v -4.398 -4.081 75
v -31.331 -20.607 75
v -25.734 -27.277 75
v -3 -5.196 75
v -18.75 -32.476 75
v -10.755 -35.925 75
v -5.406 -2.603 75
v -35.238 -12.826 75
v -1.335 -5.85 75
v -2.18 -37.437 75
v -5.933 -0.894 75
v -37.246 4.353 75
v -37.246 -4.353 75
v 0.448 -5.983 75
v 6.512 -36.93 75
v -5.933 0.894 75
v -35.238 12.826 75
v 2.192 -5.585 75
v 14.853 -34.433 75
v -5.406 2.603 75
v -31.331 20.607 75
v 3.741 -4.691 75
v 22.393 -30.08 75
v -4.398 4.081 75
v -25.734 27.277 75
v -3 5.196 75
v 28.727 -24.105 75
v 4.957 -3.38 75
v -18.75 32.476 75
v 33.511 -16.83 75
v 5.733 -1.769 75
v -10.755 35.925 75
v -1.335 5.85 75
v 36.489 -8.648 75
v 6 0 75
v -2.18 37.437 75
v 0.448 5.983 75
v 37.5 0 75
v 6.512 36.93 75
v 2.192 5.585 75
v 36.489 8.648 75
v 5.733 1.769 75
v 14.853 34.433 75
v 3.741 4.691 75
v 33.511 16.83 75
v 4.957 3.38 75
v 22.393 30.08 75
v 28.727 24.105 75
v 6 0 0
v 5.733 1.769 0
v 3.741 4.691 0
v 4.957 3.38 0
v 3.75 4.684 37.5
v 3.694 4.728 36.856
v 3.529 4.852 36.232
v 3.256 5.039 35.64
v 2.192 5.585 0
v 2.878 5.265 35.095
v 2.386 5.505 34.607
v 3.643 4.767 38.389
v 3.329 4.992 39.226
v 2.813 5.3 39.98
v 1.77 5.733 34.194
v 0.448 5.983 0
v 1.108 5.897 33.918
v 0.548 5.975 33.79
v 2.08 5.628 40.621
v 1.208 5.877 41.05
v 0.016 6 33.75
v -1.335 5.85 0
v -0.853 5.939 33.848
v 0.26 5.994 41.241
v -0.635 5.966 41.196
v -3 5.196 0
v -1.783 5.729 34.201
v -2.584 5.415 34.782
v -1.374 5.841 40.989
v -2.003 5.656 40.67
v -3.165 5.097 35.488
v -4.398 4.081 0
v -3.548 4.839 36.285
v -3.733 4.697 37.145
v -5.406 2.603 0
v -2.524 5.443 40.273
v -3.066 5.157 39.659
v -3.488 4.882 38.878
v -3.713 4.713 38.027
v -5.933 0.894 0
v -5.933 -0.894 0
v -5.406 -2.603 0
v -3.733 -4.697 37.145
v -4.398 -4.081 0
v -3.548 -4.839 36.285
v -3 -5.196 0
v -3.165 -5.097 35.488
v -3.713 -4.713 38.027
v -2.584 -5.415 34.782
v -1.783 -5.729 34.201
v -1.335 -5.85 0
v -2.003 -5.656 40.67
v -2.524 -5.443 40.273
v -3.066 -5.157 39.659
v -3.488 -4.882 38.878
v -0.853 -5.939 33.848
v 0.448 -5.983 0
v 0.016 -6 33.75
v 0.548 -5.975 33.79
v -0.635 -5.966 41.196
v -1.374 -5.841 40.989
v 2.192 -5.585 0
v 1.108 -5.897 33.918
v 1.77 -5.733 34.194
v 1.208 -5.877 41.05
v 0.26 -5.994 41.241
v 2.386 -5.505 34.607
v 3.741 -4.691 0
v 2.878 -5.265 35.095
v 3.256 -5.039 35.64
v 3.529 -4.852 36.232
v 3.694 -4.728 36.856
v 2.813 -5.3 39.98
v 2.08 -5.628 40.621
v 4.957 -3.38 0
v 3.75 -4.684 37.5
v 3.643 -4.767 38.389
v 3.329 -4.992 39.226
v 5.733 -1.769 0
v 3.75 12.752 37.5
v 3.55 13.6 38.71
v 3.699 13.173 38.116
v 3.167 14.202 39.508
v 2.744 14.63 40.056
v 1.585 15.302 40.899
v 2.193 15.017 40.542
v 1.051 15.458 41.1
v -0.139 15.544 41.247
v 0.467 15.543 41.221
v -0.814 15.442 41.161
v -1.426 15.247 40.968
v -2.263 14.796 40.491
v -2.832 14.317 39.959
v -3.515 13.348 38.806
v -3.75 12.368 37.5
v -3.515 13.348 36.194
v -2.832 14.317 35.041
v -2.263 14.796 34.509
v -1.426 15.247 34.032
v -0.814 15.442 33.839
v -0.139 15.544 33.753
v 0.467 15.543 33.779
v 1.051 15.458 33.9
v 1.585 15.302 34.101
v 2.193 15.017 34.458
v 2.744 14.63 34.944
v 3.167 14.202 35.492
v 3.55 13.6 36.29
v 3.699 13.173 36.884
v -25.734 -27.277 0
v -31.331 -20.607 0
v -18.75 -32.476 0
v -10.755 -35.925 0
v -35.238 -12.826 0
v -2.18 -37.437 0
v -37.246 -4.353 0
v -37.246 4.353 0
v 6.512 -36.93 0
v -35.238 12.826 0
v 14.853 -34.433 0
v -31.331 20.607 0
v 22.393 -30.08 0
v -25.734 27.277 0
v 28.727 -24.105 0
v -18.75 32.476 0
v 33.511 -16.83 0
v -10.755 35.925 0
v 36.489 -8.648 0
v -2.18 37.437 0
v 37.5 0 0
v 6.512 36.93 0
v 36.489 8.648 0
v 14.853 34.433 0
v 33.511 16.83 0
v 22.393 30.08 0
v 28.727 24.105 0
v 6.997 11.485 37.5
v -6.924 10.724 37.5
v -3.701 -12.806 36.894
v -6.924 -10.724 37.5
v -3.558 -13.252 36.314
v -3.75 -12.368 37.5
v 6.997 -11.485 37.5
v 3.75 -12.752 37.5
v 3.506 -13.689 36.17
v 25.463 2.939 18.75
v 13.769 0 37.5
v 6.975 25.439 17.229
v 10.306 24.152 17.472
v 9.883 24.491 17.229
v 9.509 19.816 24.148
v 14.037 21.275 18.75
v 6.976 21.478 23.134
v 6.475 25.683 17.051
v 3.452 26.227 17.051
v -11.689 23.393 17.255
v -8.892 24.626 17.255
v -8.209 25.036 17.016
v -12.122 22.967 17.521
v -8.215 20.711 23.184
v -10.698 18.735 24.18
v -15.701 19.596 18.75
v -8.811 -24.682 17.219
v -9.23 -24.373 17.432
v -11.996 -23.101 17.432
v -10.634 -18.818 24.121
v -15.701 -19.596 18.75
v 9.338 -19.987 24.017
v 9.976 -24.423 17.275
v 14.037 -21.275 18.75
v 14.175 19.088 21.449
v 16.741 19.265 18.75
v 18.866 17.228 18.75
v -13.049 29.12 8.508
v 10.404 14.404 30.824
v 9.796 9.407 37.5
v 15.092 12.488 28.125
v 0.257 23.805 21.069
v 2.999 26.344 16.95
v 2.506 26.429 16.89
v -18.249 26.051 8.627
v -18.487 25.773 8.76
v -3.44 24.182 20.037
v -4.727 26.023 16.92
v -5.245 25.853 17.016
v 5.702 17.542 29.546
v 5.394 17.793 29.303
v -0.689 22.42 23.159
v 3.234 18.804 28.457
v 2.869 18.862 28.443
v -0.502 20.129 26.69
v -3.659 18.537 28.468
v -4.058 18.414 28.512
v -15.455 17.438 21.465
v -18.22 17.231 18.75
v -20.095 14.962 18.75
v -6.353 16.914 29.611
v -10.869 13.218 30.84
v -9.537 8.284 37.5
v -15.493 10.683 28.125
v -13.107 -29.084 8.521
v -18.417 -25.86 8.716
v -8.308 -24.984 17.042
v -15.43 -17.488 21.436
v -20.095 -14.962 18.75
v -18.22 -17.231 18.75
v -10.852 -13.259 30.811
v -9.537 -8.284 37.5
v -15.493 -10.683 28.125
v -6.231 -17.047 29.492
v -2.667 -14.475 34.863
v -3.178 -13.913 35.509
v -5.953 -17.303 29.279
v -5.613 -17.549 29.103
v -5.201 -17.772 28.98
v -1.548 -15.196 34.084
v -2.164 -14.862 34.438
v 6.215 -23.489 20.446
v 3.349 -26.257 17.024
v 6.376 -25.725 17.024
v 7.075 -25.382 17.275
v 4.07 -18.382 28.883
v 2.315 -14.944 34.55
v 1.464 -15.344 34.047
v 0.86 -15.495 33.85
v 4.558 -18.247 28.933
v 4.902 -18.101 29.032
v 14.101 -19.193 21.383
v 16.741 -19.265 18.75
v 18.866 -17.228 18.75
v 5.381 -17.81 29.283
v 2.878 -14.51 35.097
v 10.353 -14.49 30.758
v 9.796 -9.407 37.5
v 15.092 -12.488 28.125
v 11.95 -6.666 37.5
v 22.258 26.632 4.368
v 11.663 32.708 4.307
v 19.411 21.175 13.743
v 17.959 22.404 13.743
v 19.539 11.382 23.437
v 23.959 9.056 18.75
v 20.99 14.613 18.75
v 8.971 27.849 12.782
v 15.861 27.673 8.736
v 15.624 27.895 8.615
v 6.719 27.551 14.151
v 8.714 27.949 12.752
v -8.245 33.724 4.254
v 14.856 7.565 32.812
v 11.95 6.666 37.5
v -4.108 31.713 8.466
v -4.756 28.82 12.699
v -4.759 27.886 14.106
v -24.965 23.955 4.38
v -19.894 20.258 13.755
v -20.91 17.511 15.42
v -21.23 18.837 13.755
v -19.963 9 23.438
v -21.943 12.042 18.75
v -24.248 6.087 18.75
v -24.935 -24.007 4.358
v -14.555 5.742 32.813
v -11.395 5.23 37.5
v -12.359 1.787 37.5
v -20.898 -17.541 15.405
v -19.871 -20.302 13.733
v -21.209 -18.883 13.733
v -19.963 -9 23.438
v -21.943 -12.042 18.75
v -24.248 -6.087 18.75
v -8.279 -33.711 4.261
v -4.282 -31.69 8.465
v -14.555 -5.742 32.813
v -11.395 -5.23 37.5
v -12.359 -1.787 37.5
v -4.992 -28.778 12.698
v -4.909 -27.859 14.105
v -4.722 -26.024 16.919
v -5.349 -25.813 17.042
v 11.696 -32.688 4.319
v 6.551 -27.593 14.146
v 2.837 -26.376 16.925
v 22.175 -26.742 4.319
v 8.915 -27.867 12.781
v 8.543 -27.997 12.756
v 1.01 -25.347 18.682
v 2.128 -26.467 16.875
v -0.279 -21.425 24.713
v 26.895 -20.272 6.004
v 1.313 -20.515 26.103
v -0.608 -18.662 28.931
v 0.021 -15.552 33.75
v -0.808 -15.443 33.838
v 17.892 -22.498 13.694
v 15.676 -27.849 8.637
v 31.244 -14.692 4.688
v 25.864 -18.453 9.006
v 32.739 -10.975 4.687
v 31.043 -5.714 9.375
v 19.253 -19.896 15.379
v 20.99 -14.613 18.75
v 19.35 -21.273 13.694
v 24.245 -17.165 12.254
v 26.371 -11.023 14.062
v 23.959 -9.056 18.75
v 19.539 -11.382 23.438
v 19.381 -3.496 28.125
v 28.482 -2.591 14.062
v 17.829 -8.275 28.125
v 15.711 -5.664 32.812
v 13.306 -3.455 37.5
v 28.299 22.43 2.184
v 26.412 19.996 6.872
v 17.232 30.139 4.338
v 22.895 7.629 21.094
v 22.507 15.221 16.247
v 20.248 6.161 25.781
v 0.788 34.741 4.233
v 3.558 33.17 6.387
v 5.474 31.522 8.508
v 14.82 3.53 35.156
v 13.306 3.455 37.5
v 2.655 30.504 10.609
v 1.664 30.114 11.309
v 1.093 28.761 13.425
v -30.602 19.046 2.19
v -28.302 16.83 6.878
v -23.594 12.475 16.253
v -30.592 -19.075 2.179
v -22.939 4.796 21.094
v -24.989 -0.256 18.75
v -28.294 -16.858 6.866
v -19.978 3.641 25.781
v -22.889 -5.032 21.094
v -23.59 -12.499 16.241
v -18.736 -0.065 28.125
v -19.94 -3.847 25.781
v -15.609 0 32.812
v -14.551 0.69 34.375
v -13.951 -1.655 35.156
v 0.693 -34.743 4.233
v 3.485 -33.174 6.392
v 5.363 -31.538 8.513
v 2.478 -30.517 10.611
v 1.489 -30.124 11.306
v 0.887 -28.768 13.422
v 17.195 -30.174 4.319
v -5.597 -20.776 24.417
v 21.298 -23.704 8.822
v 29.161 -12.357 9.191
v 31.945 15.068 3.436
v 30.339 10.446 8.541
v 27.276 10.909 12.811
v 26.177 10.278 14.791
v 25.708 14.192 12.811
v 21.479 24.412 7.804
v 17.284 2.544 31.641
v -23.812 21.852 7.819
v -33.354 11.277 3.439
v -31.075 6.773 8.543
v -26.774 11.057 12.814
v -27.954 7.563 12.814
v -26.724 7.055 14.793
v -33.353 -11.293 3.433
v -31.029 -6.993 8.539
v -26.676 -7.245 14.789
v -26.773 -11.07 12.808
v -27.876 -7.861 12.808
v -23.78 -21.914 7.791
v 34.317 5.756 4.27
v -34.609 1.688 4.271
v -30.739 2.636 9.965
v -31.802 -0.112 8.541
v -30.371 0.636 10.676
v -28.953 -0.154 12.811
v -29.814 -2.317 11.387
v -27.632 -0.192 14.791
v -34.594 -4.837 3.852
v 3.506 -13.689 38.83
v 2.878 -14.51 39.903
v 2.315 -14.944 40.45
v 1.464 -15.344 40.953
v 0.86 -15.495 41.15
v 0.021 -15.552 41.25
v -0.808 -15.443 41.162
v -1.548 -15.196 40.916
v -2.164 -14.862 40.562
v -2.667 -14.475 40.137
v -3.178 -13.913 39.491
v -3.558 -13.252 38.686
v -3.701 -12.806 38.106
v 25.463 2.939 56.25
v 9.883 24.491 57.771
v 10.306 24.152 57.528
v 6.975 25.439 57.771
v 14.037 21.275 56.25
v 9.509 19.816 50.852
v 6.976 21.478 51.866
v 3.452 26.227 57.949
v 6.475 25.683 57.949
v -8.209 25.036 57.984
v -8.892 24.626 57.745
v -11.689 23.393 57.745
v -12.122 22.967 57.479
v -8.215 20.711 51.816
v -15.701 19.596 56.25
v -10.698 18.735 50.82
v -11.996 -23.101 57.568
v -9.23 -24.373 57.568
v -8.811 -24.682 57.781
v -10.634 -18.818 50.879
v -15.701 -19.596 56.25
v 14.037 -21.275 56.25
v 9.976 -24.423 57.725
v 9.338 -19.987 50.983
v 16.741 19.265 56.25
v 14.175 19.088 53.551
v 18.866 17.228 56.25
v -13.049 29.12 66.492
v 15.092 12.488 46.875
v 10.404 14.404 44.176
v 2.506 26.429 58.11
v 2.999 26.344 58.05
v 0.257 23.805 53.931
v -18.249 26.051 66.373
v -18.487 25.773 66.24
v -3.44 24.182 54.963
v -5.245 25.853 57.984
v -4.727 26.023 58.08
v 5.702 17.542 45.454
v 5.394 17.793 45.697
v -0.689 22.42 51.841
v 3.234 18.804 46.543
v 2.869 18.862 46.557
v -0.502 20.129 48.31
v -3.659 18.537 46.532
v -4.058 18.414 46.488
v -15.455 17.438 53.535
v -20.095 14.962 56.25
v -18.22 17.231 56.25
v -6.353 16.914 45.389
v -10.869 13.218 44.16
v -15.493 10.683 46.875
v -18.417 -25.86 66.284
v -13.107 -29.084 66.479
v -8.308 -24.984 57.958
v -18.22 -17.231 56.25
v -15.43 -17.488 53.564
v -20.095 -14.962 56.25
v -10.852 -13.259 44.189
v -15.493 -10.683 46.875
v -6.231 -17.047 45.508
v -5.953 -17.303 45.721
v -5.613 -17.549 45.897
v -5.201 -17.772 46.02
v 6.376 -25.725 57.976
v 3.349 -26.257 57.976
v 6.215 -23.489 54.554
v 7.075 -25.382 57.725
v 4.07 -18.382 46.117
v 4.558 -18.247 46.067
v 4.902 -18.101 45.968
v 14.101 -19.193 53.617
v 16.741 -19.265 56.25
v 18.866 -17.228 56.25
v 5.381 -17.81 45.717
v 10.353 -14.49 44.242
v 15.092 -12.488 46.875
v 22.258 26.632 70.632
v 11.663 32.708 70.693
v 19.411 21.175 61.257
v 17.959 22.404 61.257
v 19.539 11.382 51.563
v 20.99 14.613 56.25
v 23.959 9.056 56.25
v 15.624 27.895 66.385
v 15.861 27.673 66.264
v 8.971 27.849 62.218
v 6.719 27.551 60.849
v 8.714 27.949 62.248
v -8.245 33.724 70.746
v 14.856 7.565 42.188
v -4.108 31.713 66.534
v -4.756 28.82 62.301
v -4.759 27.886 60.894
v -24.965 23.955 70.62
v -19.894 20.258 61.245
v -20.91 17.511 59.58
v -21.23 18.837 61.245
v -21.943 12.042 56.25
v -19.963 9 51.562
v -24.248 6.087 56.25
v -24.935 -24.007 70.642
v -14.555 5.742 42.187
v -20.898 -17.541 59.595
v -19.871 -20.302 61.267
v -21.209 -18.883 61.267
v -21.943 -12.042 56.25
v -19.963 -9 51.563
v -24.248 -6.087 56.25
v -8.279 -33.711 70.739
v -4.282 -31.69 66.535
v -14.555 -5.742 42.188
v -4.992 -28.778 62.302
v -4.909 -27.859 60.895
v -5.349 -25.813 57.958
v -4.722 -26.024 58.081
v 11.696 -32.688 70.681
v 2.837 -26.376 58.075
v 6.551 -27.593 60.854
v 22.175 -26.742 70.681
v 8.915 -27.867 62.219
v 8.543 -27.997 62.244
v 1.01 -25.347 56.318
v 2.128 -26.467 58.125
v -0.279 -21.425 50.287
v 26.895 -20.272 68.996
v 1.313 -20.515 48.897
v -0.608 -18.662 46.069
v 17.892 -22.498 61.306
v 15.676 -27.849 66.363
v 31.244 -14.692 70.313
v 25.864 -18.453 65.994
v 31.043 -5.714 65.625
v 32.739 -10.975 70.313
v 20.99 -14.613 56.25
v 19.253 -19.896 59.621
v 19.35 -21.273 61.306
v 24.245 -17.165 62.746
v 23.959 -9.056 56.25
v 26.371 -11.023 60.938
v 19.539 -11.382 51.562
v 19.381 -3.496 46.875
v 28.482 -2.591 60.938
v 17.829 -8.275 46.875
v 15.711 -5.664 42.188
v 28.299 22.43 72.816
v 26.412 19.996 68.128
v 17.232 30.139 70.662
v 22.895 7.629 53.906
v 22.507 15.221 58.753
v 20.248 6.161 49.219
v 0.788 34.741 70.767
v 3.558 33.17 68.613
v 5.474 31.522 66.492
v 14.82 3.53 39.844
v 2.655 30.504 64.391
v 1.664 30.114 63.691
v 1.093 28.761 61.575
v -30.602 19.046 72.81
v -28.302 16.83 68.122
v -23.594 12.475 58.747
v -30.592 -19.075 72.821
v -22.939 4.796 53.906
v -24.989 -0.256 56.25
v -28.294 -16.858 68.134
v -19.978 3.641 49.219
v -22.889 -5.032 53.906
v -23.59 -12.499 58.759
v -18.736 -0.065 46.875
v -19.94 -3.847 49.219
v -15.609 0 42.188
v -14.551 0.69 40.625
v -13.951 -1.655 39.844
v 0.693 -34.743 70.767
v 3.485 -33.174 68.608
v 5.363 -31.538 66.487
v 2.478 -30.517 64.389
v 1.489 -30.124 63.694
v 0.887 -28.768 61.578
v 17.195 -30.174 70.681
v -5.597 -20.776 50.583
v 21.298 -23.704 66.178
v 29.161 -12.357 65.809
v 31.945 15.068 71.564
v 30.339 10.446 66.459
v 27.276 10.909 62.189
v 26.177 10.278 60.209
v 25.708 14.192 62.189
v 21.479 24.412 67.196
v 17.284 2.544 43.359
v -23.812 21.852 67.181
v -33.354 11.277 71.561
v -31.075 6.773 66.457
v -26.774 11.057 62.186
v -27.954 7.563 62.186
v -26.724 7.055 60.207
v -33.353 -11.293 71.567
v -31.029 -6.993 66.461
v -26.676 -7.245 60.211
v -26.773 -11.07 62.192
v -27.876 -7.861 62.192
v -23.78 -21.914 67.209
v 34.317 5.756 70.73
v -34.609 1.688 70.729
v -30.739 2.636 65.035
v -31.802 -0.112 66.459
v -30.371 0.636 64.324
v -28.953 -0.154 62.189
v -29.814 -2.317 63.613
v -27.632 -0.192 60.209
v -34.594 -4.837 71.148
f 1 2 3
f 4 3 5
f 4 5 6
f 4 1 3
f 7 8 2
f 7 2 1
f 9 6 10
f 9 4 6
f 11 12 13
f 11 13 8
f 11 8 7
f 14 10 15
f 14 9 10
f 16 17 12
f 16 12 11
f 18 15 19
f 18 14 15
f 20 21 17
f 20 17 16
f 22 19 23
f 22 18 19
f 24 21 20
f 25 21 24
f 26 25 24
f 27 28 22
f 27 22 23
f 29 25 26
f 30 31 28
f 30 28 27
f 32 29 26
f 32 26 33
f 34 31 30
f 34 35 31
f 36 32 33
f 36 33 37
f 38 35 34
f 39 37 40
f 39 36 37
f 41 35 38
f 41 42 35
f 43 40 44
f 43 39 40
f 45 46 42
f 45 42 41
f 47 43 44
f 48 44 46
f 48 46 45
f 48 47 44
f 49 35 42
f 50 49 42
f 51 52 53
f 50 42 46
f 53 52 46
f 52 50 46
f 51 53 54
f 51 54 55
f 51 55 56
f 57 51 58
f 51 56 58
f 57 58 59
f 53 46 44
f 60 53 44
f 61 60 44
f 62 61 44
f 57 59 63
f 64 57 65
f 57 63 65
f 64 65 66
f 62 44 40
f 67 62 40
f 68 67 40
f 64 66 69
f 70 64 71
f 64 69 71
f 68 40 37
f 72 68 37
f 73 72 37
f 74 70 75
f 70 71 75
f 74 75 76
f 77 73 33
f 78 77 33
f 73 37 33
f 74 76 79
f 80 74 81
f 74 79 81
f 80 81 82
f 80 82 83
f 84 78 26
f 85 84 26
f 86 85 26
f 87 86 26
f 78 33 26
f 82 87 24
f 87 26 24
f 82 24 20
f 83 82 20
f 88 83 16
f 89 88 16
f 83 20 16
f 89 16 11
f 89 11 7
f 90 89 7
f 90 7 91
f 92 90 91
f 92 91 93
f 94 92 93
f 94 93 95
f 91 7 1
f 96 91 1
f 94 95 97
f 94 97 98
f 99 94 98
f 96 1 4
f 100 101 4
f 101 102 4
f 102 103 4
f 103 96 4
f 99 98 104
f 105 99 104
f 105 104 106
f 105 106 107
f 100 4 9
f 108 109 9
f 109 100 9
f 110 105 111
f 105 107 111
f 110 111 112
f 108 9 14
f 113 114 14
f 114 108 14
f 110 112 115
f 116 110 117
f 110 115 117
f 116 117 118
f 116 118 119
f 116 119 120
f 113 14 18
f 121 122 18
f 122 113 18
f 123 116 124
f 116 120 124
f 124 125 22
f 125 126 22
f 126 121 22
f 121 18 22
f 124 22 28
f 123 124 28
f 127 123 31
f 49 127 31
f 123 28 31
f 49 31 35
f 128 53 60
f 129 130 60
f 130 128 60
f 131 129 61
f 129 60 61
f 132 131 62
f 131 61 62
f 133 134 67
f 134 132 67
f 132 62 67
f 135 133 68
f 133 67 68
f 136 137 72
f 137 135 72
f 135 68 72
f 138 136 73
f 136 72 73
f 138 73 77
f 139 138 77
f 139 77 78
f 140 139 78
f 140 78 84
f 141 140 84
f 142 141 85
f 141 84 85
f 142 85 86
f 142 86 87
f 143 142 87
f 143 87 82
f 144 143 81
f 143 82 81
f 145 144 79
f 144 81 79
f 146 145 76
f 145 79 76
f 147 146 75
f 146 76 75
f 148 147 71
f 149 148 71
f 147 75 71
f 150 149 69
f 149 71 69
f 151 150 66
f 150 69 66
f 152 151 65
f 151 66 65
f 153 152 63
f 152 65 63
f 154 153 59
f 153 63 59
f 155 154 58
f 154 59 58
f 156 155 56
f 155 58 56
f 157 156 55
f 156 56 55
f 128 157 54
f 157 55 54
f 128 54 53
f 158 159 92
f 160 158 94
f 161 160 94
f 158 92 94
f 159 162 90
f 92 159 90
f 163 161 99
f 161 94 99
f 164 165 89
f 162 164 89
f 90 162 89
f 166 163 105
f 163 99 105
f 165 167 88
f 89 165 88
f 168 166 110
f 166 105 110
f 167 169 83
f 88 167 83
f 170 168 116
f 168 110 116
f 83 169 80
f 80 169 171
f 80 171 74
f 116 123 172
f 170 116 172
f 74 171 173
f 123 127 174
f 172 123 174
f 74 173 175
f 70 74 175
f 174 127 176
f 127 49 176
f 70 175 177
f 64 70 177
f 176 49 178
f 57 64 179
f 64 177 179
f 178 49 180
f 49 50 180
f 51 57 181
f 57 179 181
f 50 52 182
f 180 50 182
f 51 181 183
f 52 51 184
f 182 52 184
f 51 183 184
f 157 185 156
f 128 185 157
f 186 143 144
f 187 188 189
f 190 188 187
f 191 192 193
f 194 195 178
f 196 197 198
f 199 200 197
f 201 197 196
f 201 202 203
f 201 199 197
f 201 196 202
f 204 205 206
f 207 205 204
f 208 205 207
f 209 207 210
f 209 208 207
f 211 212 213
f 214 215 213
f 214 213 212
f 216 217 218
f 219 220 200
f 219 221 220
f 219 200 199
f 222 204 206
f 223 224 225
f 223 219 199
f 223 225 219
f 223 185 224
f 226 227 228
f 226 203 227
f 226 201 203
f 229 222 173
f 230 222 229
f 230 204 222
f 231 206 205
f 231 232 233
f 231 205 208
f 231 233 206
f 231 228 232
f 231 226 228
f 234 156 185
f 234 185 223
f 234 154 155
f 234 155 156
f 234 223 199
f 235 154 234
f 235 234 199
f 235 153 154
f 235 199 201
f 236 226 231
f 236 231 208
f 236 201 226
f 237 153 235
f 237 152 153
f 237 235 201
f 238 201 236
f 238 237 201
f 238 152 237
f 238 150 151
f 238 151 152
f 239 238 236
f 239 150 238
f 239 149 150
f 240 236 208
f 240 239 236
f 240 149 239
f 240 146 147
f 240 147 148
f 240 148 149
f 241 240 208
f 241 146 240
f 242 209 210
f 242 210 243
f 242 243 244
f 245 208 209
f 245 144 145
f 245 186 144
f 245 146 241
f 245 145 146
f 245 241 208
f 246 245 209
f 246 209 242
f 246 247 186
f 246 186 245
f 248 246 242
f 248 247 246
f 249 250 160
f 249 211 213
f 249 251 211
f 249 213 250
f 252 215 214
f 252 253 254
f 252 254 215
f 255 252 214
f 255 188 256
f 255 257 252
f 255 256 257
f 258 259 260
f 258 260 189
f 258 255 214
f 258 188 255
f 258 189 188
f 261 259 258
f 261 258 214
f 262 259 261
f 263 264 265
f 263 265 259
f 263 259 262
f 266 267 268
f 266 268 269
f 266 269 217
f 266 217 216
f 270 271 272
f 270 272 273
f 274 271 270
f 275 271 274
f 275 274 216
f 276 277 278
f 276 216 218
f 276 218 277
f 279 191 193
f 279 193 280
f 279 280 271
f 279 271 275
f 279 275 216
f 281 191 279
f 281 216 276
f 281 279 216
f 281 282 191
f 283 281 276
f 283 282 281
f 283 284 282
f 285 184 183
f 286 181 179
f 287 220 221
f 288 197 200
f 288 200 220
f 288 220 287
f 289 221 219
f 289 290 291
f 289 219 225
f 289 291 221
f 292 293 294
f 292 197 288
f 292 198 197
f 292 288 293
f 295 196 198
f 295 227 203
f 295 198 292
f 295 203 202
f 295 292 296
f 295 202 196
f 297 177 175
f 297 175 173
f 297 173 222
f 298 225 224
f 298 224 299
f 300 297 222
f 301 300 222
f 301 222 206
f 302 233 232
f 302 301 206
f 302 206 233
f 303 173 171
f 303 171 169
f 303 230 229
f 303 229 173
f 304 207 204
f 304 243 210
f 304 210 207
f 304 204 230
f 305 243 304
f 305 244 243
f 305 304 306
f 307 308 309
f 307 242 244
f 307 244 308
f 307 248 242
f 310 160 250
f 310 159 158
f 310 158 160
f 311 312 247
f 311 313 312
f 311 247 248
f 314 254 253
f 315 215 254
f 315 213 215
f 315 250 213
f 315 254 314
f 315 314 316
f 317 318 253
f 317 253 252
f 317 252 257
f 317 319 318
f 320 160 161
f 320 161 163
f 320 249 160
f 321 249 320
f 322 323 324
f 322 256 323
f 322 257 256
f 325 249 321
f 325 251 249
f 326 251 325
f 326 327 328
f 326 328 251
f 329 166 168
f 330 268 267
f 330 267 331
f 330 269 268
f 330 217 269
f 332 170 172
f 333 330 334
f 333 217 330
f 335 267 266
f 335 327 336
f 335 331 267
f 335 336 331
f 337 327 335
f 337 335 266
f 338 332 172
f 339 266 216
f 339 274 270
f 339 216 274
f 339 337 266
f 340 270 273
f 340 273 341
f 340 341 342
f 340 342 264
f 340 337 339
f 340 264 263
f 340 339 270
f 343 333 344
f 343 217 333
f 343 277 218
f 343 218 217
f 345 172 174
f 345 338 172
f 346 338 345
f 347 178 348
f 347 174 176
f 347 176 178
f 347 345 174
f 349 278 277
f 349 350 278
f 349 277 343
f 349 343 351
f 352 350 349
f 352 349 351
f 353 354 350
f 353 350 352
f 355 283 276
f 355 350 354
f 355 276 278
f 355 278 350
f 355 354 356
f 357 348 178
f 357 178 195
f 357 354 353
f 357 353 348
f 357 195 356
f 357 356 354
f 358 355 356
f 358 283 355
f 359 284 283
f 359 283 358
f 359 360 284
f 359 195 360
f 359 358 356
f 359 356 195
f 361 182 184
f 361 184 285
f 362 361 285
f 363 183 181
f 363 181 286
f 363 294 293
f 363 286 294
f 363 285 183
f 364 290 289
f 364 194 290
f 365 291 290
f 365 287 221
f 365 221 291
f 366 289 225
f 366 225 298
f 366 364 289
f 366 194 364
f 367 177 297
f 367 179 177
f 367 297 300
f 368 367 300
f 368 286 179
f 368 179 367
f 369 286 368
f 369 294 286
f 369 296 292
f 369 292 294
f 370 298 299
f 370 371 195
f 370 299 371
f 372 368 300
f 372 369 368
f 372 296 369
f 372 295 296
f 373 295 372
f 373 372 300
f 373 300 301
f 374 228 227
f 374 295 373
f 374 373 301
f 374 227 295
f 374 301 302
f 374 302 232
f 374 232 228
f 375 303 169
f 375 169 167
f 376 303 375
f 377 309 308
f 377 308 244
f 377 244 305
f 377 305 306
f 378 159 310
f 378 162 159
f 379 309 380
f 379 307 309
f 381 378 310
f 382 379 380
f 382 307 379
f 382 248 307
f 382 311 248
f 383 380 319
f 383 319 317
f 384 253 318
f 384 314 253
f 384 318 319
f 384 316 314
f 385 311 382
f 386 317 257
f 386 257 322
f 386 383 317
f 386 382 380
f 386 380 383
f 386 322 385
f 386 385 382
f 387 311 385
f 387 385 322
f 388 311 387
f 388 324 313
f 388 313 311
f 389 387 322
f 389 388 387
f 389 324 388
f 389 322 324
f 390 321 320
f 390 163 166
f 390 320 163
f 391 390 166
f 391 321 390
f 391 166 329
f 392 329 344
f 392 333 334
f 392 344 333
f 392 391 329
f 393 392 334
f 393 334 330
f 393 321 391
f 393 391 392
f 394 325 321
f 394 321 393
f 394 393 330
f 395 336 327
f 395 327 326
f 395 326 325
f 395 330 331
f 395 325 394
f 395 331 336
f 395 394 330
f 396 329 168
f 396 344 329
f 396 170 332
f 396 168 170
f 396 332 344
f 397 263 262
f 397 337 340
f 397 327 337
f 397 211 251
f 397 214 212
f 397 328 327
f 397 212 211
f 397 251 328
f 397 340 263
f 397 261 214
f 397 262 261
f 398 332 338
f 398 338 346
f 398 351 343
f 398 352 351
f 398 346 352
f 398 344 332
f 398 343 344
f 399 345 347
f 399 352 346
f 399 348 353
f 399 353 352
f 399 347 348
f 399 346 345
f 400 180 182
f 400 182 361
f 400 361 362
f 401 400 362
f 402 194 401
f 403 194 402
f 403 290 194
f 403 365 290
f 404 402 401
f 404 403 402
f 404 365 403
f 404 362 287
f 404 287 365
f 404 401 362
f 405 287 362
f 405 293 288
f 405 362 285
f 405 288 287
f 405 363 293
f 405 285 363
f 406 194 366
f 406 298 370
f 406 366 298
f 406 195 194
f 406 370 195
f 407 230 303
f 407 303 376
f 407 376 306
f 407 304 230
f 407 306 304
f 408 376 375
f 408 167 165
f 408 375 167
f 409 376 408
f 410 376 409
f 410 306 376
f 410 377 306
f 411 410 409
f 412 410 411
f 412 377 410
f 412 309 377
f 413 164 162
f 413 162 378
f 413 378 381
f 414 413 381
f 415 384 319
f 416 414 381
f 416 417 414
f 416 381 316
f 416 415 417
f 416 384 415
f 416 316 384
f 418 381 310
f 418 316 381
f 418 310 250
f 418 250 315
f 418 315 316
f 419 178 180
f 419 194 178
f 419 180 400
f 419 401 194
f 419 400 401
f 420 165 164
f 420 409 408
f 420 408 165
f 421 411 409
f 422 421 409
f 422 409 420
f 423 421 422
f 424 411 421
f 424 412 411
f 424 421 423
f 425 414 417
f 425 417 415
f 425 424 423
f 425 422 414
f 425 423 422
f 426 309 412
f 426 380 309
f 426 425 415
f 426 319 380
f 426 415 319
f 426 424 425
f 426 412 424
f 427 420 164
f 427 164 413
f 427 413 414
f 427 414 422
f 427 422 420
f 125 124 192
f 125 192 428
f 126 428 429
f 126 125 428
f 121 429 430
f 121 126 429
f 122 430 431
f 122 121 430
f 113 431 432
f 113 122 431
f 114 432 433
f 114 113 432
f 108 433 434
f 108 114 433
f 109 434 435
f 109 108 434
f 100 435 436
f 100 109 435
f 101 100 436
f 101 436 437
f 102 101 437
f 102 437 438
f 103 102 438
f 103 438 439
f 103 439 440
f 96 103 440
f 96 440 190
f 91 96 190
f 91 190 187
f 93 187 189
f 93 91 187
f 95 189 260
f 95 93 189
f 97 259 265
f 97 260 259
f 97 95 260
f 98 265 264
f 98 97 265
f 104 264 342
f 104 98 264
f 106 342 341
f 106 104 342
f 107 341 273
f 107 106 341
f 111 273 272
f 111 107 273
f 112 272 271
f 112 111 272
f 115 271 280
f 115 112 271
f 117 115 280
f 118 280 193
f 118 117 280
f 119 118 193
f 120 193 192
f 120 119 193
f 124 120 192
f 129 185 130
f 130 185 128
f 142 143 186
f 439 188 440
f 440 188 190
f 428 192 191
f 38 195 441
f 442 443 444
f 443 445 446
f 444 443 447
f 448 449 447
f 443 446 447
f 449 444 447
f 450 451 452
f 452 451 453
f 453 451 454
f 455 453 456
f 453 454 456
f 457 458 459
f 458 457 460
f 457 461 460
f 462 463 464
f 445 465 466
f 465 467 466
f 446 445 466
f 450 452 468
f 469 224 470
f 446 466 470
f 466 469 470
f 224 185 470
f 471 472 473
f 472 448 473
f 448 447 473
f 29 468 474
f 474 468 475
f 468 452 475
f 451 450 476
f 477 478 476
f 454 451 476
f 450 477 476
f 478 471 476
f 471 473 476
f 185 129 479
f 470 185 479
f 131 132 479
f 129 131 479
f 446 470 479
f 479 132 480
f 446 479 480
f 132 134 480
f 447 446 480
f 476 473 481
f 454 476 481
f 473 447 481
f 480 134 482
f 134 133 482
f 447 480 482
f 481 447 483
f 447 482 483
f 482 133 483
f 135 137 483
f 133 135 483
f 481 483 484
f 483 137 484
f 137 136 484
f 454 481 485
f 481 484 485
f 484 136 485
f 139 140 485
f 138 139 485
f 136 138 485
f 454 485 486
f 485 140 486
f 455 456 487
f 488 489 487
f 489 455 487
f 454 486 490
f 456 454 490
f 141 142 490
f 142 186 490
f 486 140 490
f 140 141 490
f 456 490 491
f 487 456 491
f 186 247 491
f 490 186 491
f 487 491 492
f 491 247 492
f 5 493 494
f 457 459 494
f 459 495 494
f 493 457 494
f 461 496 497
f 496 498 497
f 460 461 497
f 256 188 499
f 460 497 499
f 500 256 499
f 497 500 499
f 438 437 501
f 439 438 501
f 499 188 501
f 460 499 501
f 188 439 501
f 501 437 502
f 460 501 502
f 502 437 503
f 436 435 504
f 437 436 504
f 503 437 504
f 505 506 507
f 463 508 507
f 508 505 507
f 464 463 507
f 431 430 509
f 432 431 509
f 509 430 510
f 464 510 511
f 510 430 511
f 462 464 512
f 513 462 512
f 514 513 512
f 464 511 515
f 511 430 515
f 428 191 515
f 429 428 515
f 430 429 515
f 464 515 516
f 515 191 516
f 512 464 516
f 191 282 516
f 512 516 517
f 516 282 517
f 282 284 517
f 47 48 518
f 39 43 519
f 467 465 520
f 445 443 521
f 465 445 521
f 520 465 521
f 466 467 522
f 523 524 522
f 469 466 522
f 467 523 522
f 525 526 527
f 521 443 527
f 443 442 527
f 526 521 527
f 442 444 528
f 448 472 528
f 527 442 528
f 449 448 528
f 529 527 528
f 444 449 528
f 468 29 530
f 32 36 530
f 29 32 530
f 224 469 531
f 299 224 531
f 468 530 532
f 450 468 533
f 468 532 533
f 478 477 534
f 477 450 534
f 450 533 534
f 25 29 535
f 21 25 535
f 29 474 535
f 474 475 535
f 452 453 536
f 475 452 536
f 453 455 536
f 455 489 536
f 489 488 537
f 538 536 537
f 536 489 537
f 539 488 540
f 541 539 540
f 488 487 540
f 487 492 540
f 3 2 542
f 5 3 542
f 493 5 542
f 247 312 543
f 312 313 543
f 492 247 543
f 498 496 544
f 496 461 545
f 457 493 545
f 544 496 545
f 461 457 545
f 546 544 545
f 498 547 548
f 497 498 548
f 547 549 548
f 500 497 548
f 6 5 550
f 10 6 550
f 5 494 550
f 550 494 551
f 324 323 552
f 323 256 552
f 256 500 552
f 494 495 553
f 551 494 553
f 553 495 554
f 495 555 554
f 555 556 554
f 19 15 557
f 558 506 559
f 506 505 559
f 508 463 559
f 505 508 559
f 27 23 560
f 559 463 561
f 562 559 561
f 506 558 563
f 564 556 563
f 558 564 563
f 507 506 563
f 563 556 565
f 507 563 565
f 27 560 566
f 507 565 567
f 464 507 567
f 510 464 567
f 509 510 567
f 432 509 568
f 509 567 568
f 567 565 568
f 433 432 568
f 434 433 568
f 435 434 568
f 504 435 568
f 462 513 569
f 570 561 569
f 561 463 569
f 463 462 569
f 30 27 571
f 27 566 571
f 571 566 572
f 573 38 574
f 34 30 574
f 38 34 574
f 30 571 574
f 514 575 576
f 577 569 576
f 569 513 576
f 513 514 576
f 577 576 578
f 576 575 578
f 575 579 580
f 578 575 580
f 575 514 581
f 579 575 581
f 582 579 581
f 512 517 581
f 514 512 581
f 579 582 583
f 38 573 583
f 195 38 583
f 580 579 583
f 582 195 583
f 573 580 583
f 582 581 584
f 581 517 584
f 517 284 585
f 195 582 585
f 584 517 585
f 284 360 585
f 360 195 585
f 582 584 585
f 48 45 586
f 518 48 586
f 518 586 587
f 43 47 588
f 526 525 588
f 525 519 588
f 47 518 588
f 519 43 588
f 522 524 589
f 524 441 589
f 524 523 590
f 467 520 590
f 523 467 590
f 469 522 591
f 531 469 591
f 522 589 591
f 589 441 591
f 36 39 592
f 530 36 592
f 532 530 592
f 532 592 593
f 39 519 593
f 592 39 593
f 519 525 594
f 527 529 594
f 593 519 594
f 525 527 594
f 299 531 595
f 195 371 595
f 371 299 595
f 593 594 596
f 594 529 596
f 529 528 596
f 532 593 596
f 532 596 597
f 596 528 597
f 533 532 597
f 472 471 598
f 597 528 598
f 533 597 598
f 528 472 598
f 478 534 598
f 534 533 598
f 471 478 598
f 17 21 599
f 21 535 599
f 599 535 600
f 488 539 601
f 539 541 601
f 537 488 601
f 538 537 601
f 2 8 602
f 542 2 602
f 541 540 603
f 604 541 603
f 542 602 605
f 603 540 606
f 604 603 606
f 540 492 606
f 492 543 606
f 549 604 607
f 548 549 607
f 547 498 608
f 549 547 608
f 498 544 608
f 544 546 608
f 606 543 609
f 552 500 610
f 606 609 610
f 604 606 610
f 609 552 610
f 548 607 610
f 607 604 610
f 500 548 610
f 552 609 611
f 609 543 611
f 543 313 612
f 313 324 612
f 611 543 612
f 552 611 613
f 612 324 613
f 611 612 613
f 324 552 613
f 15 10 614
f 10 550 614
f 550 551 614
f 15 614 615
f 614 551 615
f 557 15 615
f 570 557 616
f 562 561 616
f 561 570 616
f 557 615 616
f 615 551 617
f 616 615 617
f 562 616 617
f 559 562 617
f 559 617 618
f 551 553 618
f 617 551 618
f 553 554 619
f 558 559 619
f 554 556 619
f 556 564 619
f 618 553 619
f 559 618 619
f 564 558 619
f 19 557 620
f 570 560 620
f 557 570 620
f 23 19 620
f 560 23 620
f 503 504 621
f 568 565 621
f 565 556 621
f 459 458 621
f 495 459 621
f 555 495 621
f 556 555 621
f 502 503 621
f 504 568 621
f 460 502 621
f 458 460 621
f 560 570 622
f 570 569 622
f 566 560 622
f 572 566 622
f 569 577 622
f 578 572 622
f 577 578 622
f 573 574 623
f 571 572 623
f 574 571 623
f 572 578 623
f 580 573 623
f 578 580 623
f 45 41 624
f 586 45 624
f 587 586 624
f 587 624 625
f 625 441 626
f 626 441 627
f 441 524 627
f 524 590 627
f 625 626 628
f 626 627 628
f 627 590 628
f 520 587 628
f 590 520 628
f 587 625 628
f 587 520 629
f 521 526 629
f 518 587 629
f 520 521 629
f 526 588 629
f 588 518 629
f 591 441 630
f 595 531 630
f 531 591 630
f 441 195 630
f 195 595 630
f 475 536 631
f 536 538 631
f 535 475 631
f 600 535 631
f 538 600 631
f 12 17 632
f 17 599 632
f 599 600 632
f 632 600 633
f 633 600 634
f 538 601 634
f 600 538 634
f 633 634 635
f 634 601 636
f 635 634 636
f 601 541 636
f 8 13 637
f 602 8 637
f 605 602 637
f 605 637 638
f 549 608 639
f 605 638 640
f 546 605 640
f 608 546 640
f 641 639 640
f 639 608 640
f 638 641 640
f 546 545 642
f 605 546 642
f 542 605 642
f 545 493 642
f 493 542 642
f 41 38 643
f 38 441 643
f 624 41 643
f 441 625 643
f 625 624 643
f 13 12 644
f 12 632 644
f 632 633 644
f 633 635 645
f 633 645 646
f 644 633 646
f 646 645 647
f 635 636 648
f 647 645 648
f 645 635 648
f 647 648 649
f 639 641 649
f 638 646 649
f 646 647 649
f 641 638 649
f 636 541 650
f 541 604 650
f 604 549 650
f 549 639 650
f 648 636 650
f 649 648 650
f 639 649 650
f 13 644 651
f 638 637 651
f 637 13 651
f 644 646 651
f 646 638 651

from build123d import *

# Parameters (mm, degrees)
F0_R     = 37.5
F2_R     = 13.125
F5_R     = 6
F6_DEPTH = 75.001
F7_R     = 3.75
F8_DEPTH = 37.501
F9_DEPTH = 37.501


with BuildPart() as f3:
    # F0 (on Top) → F3 section 0
    with BuildSketch(Plane.XY):
        Circle(F0_R)
    # F2 (on offset) → F3 section 1
    with BuildSketch(Plane.XY.offset(37.5)):
        with Locations((0.643553, 0)):
            Circle(F2_R)
    loft()

    # F4: F3 across plane


with BuildPart() as f3_1:
    add(f3.part)
    add(f3.part.mirror(Plane.XY.offset(37.5)))

    # F5 (on face) → F6 (cut, through all)
    with BuildSketch(Plane.XY.offset(75)):
        Circle(F5_R)
    extrude(amount=-F6_DEPTH, mode=Mode.SUBTRACT)

    # F7 (on Front) → F8 (cut, through all)
    with BuildSketch(Plane.XZ):
        with Locations((0, 37.5)):
            Circle(F7_R)
    extrude(amount=-F8_DEPTH, mode=Mode.SUBTRACT)

    # F7 (on Front) → F9 (cut, through all)
    with BuildSketch(Plane.XZ):
        with Locations((0, 37.5)):
            Circle(F7_R)
    extrude(amount=F9_DEPTH, mode=Mode.SUBTRACT)


solid = f3_1.part
